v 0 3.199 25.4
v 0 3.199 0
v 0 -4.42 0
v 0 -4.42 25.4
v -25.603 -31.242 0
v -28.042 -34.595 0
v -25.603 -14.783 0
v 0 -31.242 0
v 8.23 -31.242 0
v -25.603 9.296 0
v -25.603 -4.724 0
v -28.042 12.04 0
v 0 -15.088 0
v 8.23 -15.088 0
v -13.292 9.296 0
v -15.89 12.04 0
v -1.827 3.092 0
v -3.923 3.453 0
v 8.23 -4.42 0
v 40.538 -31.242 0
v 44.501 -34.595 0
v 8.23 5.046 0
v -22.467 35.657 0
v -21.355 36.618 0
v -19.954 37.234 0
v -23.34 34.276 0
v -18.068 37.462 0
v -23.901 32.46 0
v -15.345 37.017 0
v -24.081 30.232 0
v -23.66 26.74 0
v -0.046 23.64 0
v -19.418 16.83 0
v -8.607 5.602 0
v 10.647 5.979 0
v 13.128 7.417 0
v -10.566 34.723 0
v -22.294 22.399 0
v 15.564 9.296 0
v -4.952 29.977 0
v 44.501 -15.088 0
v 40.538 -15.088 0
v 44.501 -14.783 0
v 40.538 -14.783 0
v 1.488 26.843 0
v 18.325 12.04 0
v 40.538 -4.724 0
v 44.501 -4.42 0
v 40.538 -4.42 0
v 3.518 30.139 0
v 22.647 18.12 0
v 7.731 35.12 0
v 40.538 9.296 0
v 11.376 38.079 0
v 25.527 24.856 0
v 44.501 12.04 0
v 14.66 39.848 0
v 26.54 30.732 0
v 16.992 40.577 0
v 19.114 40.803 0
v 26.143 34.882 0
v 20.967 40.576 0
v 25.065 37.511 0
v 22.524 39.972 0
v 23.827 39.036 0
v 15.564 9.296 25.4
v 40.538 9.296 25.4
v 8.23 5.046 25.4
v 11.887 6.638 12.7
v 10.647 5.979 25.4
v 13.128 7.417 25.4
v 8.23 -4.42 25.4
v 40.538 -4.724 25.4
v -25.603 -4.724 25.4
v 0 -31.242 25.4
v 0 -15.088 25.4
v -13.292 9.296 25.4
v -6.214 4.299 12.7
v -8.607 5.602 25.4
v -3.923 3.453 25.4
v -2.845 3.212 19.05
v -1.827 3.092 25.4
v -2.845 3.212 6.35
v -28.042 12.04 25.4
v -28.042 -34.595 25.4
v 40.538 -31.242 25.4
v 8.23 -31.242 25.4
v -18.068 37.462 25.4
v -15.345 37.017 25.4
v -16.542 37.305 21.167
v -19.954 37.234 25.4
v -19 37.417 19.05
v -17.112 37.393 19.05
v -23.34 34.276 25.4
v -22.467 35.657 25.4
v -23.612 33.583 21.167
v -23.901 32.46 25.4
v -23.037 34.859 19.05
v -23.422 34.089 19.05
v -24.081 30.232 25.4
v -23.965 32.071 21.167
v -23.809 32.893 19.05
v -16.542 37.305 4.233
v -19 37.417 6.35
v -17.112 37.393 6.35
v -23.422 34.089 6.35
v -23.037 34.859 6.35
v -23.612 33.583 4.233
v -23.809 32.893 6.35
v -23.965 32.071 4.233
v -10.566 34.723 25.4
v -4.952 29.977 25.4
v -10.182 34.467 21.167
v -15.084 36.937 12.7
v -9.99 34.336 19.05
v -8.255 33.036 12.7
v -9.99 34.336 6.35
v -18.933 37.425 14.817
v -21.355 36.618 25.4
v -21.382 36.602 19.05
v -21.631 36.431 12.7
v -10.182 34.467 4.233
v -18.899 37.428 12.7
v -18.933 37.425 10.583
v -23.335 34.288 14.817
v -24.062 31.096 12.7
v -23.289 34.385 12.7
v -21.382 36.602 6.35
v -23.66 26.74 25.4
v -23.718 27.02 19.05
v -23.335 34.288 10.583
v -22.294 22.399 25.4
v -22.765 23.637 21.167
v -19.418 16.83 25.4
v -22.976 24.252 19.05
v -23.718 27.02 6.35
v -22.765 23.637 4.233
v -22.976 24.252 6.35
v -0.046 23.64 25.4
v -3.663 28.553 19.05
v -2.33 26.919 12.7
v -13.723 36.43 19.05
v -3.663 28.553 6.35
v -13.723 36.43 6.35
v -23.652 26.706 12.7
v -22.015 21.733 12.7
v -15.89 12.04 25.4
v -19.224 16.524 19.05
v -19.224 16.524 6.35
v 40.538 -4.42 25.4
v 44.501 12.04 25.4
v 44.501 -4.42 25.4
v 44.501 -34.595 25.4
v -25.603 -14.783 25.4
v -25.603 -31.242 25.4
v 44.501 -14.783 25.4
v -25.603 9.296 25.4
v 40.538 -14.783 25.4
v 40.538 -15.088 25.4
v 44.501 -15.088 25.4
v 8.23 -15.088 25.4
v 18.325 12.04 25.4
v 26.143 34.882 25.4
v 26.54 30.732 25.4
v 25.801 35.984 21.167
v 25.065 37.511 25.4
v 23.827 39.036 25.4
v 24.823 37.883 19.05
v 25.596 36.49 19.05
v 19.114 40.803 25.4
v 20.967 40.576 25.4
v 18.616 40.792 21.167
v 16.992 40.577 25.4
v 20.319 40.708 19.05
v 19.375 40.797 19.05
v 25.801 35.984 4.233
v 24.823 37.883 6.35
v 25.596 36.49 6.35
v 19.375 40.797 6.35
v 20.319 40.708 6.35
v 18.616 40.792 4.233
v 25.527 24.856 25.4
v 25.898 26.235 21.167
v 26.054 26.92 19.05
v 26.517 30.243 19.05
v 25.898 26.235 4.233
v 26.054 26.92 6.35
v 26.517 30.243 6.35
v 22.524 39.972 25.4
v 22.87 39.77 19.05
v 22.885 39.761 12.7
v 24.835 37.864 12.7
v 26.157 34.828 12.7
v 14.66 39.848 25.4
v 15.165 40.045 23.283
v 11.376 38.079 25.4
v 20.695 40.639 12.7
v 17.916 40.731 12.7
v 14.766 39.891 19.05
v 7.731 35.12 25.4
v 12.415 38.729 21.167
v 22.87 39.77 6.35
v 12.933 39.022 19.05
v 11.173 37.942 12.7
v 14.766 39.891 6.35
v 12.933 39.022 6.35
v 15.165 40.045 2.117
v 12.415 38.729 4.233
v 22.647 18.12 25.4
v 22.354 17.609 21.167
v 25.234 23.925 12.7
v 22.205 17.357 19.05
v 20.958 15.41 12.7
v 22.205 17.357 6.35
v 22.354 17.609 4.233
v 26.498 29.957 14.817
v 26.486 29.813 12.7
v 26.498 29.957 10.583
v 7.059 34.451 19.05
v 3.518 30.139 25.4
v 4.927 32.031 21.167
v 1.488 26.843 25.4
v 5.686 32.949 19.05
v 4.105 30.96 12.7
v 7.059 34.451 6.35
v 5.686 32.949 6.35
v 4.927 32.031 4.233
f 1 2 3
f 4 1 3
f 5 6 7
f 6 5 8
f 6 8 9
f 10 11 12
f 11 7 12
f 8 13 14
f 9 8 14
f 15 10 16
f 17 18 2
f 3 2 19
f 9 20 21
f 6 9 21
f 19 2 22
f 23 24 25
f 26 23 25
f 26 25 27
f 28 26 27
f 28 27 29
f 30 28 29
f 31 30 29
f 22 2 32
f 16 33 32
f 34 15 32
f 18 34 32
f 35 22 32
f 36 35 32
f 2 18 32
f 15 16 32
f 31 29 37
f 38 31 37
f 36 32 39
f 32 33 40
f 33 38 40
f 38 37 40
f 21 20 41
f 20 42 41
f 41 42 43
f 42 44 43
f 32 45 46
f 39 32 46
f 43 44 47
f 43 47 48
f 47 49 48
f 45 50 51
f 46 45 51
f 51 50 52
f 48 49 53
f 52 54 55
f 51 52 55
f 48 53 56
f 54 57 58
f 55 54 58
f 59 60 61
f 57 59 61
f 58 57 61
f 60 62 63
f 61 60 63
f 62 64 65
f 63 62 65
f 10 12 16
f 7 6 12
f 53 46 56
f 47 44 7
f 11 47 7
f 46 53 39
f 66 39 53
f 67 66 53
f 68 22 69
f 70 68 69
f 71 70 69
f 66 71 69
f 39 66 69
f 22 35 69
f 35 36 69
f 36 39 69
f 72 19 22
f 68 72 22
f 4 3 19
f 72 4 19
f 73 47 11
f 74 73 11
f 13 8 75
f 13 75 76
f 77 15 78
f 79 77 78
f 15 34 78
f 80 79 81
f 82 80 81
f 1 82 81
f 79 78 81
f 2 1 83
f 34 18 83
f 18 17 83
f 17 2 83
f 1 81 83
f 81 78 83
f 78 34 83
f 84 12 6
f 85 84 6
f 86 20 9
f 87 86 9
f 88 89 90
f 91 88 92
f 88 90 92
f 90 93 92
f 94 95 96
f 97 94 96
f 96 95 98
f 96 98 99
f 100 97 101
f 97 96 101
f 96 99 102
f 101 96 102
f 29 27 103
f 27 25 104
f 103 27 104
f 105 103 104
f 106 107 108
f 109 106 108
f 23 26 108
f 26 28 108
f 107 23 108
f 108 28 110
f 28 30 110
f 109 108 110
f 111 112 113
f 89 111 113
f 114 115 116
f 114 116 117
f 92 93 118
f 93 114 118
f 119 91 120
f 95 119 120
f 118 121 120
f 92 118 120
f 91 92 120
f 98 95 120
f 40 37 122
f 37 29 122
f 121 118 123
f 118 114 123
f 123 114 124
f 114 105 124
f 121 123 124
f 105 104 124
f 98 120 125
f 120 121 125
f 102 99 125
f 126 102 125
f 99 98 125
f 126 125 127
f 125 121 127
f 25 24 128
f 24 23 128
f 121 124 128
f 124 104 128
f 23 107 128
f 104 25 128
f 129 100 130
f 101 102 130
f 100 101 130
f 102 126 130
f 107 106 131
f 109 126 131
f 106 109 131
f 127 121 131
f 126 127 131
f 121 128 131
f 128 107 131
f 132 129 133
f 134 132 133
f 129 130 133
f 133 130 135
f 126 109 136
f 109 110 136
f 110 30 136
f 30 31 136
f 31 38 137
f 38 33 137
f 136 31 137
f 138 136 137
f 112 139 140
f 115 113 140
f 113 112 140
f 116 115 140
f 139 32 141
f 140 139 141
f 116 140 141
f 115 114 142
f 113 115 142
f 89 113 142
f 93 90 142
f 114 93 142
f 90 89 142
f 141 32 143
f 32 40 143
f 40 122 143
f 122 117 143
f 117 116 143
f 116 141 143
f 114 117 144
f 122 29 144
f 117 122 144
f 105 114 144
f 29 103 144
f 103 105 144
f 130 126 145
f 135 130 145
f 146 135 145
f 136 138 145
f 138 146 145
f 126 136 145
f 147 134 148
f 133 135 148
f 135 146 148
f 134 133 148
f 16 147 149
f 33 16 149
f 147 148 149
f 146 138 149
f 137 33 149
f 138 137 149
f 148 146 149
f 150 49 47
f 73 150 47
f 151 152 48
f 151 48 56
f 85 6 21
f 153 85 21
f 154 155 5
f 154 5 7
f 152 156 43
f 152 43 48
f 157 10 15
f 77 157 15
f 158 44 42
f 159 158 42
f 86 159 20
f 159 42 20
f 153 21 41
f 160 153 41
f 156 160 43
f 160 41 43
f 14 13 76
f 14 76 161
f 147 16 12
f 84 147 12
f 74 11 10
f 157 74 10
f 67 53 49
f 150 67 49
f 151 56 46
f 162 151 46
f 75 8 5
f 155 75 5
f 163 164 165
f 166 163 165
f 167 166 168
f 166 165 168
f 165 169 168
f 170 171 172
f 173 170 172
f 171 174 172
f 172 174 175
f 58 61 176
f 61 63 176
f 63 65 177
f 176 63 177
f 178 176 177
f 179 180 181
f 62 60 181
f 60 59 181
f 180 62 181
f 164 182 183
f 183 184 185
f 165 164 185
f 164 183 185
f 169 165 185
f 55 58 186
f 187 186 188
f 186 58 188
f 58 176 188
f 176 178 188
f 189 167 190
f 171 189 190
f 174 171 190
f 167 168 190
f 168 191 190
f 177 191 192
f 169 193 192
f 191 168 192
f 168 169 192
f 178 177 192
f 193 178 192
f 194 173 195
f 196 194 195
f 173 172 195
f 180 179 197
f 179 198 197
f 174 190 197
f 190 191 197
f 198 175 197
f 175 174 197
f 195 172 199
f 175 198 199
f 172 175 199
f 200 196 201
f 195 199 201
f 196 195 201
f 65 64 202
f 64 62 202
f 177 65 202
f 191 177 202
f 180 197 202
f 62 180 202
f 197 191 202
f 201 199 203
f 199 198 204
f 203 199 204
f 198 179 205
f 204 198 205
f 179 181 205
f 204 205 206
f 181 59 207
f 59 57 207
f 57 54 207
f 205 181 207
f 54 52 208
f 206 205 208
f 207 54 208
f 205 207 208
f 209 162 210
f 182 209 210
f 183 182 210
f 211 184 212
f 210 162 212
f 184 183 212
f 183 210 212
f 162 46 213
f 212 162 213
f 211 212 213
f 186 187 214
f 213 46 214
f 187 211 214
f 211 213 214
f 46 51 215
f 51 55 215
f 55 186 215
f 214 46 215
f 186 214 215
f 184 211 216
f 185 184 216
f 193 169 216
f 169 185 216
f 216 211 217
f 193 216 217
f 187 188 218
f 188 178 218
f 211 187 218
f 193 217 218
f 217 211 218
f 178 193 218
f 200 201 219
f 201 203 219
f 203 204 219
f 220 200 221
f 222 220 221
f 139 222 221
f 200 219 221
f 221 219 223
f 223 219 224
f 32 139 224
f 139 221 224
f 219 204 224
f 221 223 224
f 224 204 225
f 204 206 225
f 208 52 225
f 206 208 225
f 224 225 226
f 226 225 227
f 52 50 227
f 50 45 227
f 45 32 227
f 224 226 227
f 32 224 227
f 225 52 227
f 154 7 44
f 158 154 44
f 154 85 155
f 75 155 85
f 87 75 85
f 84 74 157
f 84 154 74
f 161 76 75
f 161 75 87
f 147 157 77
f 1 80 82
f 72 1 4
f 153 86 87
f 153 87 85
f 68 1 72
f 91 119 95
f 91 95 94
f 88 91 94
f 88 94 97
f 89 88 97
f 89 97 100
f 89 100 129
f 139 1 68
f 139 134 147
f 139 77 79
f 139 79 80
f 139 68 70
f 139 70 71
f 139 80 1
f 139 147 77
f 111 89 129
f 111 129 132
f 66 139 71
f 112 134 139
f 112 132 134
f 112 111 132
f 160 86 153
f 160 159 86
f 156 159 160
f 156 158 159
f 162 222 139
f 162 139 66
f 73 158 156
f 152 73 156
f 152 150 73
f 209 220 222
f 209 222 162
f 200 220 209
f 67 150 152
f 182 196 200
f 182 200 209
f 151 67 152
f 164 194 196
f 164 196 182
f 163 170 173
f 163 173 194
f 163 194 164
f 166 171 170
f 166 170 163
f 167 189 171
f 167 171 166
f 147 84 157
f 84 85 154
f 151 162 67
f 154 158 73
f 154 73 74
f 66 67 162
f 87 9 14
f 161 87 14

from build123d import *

# Parameters (mm, degrees)
F0_W     = 3.9624013007
F0_H     = 0.3047999926
F0_H_2   = 10.0584002212
F0_H_3   = 0.3047995269
F0_W_2   = 25.6032012403
F0_W_3   = 8.2296002656
F0_W_4   = 32.308800146
F0_H_4   = 16.1544019356
F1_DEPTH = 25.4


with BuildPart() as f1:
    # F0 (on Top) → F1 (new body)
    with BuildSketch(Plane.XY):
        with BuildLine():
            Line((-15.8900667789, 12.0395999402), (-28.041601181, 12.0395999402))
            Line((-28.041601181, 12.0395999402), (-28.041601181, -4.4196001254))
            Line((-28.041601181, -4.4196001254), (-28.041601181, -4.724400118))
            Line((-28.041601181, -4.724400118), (-28.041601181, -34.5948003232))
            Line((-28.041601181, -34.5948003232), (44.5008017123, -34.5948003232))
            Line((44.5008017123, -34.5948003232), (44.5008017123, -15.0875998661))
            Line((44.5008017123, -15.0875998661), (40.5384004116, -15.0875998661))
            Line((40.5384004116, -15.0875998661), (40.5384004116, -31.2420018017))
            Line((40.5384004116, -31.2420018017), (8.2296002656, -31.2420018017))
            Line((8.2296002656, -31.2420018017), (0, -31.2420018017))
            Line((0, -31.2420018017), (-25.6032012403, -31.2420018017))
            Line((-25.6032012403, -31.2420018017), (-25.6032012403, -15.0875998661))
            Line((-25.6032012403, -15.0875998661), (-25.6032012403, -14.7828003392))
            Line((-25.6032012403, -14.7828003392), (-25.6032012403, -4.724400118))
            Line((-25.6032012403, -4.724400118), (-25.6032012403, -4.4196001254))
            Line((-25.6032012403, -4.4196001254), (-25.6032012403, 9.2964004725))
            Line((-25.6032012403, 9.2964004725), (-13.2922040161, 9.2964004725))
            add(Edge.make_bspline(
                [(-15.8900667789, 12.0395999402), (-14.6364848786, 10.577993733), (-13.2922040161, 9.2964004725)],
                knots=[4.8620981812, 4.8620981812, 4.8620981812, 5.0551404857, 5.0551404857, 5.0551404857], degree=2, weights=[1, 0.9953454489, 1]))
        make_face()
        with BuildLine():
            add(Edge.make_bspline(
                [(-0.0459524764, 23.6396354942), (-12.3075236755, 43.2568413675), (-21.6312349961, 36.4306230791), (-30.9549463168, 29.6044047908), (-15.8900667789, 12.0395999402)],
                knots=[1.4186969328, 1.4186969328, 1.4186969328, 3.140397557, 3.140397557, 4.8620981812, 4.8620981812, 4.8620981812], degree=2, weights=[1, 0.6517928297, 1, 0.6517928297, 1]))
            Line((-15.8900667789, 12.0395999402), (18.3251665875, 12.0395999402))
            add(Edge.make_bspline(
                [(18.3251665875, 12.0395999402), (35.7401088205, 31.6436219481), (22.8849123581, 39.7607505508), (10.0297158956, 47.8778791536), (-0.0459524764, 23.6396354942)],
                knots=[1.2787151362, 1.2787151362, 1.2787151362, 3.1389972234, 3.1389972234, 4.9992793106, 4.9992793106, 4.9992793106], degree=2, weights=[1, 0.597720913, 1, 0.597720913, 1]))
        make_face()
        with BuildLine():
            Line((18.3251665875, 12.0395999402), (-15.8900667789, 12.0395999402))
            add(Edge.make_bspline(
                [(-15.8900667789, 12.0395999402), (-14.6364848786, 10.577993733), (-13.2922040161, 9.2964004725)],
                knots=[4.8620981812, 4.8620981812, 4.8620981812, 5.0551404857, 5.0551404857, 5.0551404857], degree=2, weights=[1, 0.9953454489, 1]))
            Line((-13.2922040161, 9.2964004725), (0, 9.2964004725))
            Line((0, 9.2964004725), (8.2296002656, 9.2964004725))
            Line((8.2296002656, 9.2964004725), (15.5637197095, 9.2964004725))
            add(Edge.make_bspline(
                [(15.5637197095, 9.2964004725), (16.9943693083, 10.5415197973), (18.3251665875, 12.0395999402)],
                knots=[1.0744371021, 1.0744371021, 1.0744371021, 1.2787151362, 1.2787151362, 1.2787151362], degree=2, weights=[1, 0.9947883438, 1]))
        make_face()
        with BuildLine():
            Line((44.5008017123, 12.0395999402), (18.3251665875, 12.0395999402))
            add(Edge.make_bspline(
                [(15.5637197095, 9.2964004725), (16.9943693083, 10.5415197973), (18.3251665875, 12.0395999402)],
                knots=[1.0744371021, 1.0744371021, 1.0744371021, 1.2787151362, 1.2787151362, 1.2787151362], degree=2, weights=[1, 0.9947883438, 1]))
            Line((15.5637197095, 9.2964004725), (40.5384004116, 9.2964004725))
            Line((40.5384004116, 9.2964004725), (40.5384004116, -4.4196001254))
            Line((40.5384004116, -4.4196001254), (44.5008017123, -4.4196001254))
            Line((44.5008017123, -4.4196001254), (44.5008017123, 12.0395999402))
        make_face()
        with Locations((42.5196010619, -4.5720001217)):
            Rectangle(F0_W, F0_H)
        with Locations((42.5196010619, -9.7536002286)):
            Rectangle(F0_W, F0_H_2)
        with Locations((42.5196010619, -14.9352001026)):
            Rectangle(F0_W, F0_H_3)
        with Locations((-12.8016006202, -9.7536002286)):
            Rectangle(F0_W_2, F0_H_2)
        with Locations((4.1148001328, -9.7536002286)):
            Rectangle(F0_W_3, F0_H_2)
        with BuildLine():
            add(Edge.make_bspline(
                [(0, 3.1989152126), (1.8653131229, 3.5637931111), (3.0191065103, 4.951677723)],
                knots=[6.0534716383, 6.0534716383, 6.0534716383, 6.4052485225, 6.4052485225, 6.4052485225], degree=2, weights=[1, 0.9845714653, 1]))
            Line((0, 3.1989152126), (0, -4.4196001254))
            Line((0, -4.4196001254), (8.2296002656, -4.4196001254))
            Line((8.2296002656, -4.4196001254), (8.2296002656, 5.0463356319))
            add(Edge.make_bspline(
                [(3.0191065103, 4.951677723), (5.3356081965, 4.2204520834), (8.2296002656, 5.0463356319)],
                knots=[0.1444827752, 0.1444827752, 0.1444827752, 0.5578499882, 0.5578499882, 0.5578499882], degree=2, weights=[1, 0.9787168701, 1]))
        make_face()
        with BuildLine():
            Line((8.2296002656, 9.2964004725), (0, 9.2964004725))
            Line((0, 9.2964004725), (0, 3.1989152126))
            add(Edge.make_bspline(
                [(0, 3.1989152126), (1.8653131229, 3.5637931111), (3.0191065103, 4.951677723)],
                knots=[6.0534716383, 6.0534716383, 6.0534716383, 6.4052485225, 6.4052485225, 6.4052485225], degree=2, weights=[1, 0.9845714653, 1]))
            add(Edge.make_bspline(
                [(3.0191065103, 4.951677723), (5.3356081965, 4.2204520834), (8.2296002656, 5.0463356319)],
                knots=[0.1444827752, 0.1444827752, 0.1444827752, 0.5578499882, 0.5578499882, 0.5578499882], degree=2, weights=[1, 0.9787168701, 1]))
            Line((8.2296002656, 5.0463356319), (8.2296002656, 9.2964004725))
        make_face()
        with Locations((24.3840003386, -9.7536002286)):
            Rectangle(F0_W_4, F0_H_2)
        with Locations((4.1148001328, -23.1648008339)):
            Rectangle(F0_W_3, F0_H_4)
        with BuildLine():
            Line((0, 9.2964004725), (-13.2922040161, 9.2964004725))
            add(Edge.make_bspline(
                [(-13.2922040161, 9.2964004725), (-5.7223534788, 2.0795533819), (0, 3.1989152126)],
                knots=[5.0551404857, 5.0551404857, 5.0551404857, 6.0534716383, 6.0534716383, 6.0534716383], degree=2, weights=[1, 0.8779823004, 1]))
            Line((0, 3.1989152126), (0, 9.2964004725))
        make_face()
        with BuildLine():
            add(Edge.make_bspline(
                [(8.2296002656, 5.0463356319), (11.8760455455, 6.0869532617), (15.5637197095, 9.2964004725)],
                knots=[0.5578499882, 0.5578499882, 0.5578499882, 1.0744371021, 1.0744371021, 1.0744371021], degree=2, weights=[1, 0.9668272642, 1]))
            Line((15.5637197095, 9.2964004725), (8.2296002656, 9.2964004725))
            Line((8.2296002656, 9.2964004725), (8.2296002656, 5.0463356319))
        make_face()
    extrude(amount=F1_DEPTH)


solid = f1.part
